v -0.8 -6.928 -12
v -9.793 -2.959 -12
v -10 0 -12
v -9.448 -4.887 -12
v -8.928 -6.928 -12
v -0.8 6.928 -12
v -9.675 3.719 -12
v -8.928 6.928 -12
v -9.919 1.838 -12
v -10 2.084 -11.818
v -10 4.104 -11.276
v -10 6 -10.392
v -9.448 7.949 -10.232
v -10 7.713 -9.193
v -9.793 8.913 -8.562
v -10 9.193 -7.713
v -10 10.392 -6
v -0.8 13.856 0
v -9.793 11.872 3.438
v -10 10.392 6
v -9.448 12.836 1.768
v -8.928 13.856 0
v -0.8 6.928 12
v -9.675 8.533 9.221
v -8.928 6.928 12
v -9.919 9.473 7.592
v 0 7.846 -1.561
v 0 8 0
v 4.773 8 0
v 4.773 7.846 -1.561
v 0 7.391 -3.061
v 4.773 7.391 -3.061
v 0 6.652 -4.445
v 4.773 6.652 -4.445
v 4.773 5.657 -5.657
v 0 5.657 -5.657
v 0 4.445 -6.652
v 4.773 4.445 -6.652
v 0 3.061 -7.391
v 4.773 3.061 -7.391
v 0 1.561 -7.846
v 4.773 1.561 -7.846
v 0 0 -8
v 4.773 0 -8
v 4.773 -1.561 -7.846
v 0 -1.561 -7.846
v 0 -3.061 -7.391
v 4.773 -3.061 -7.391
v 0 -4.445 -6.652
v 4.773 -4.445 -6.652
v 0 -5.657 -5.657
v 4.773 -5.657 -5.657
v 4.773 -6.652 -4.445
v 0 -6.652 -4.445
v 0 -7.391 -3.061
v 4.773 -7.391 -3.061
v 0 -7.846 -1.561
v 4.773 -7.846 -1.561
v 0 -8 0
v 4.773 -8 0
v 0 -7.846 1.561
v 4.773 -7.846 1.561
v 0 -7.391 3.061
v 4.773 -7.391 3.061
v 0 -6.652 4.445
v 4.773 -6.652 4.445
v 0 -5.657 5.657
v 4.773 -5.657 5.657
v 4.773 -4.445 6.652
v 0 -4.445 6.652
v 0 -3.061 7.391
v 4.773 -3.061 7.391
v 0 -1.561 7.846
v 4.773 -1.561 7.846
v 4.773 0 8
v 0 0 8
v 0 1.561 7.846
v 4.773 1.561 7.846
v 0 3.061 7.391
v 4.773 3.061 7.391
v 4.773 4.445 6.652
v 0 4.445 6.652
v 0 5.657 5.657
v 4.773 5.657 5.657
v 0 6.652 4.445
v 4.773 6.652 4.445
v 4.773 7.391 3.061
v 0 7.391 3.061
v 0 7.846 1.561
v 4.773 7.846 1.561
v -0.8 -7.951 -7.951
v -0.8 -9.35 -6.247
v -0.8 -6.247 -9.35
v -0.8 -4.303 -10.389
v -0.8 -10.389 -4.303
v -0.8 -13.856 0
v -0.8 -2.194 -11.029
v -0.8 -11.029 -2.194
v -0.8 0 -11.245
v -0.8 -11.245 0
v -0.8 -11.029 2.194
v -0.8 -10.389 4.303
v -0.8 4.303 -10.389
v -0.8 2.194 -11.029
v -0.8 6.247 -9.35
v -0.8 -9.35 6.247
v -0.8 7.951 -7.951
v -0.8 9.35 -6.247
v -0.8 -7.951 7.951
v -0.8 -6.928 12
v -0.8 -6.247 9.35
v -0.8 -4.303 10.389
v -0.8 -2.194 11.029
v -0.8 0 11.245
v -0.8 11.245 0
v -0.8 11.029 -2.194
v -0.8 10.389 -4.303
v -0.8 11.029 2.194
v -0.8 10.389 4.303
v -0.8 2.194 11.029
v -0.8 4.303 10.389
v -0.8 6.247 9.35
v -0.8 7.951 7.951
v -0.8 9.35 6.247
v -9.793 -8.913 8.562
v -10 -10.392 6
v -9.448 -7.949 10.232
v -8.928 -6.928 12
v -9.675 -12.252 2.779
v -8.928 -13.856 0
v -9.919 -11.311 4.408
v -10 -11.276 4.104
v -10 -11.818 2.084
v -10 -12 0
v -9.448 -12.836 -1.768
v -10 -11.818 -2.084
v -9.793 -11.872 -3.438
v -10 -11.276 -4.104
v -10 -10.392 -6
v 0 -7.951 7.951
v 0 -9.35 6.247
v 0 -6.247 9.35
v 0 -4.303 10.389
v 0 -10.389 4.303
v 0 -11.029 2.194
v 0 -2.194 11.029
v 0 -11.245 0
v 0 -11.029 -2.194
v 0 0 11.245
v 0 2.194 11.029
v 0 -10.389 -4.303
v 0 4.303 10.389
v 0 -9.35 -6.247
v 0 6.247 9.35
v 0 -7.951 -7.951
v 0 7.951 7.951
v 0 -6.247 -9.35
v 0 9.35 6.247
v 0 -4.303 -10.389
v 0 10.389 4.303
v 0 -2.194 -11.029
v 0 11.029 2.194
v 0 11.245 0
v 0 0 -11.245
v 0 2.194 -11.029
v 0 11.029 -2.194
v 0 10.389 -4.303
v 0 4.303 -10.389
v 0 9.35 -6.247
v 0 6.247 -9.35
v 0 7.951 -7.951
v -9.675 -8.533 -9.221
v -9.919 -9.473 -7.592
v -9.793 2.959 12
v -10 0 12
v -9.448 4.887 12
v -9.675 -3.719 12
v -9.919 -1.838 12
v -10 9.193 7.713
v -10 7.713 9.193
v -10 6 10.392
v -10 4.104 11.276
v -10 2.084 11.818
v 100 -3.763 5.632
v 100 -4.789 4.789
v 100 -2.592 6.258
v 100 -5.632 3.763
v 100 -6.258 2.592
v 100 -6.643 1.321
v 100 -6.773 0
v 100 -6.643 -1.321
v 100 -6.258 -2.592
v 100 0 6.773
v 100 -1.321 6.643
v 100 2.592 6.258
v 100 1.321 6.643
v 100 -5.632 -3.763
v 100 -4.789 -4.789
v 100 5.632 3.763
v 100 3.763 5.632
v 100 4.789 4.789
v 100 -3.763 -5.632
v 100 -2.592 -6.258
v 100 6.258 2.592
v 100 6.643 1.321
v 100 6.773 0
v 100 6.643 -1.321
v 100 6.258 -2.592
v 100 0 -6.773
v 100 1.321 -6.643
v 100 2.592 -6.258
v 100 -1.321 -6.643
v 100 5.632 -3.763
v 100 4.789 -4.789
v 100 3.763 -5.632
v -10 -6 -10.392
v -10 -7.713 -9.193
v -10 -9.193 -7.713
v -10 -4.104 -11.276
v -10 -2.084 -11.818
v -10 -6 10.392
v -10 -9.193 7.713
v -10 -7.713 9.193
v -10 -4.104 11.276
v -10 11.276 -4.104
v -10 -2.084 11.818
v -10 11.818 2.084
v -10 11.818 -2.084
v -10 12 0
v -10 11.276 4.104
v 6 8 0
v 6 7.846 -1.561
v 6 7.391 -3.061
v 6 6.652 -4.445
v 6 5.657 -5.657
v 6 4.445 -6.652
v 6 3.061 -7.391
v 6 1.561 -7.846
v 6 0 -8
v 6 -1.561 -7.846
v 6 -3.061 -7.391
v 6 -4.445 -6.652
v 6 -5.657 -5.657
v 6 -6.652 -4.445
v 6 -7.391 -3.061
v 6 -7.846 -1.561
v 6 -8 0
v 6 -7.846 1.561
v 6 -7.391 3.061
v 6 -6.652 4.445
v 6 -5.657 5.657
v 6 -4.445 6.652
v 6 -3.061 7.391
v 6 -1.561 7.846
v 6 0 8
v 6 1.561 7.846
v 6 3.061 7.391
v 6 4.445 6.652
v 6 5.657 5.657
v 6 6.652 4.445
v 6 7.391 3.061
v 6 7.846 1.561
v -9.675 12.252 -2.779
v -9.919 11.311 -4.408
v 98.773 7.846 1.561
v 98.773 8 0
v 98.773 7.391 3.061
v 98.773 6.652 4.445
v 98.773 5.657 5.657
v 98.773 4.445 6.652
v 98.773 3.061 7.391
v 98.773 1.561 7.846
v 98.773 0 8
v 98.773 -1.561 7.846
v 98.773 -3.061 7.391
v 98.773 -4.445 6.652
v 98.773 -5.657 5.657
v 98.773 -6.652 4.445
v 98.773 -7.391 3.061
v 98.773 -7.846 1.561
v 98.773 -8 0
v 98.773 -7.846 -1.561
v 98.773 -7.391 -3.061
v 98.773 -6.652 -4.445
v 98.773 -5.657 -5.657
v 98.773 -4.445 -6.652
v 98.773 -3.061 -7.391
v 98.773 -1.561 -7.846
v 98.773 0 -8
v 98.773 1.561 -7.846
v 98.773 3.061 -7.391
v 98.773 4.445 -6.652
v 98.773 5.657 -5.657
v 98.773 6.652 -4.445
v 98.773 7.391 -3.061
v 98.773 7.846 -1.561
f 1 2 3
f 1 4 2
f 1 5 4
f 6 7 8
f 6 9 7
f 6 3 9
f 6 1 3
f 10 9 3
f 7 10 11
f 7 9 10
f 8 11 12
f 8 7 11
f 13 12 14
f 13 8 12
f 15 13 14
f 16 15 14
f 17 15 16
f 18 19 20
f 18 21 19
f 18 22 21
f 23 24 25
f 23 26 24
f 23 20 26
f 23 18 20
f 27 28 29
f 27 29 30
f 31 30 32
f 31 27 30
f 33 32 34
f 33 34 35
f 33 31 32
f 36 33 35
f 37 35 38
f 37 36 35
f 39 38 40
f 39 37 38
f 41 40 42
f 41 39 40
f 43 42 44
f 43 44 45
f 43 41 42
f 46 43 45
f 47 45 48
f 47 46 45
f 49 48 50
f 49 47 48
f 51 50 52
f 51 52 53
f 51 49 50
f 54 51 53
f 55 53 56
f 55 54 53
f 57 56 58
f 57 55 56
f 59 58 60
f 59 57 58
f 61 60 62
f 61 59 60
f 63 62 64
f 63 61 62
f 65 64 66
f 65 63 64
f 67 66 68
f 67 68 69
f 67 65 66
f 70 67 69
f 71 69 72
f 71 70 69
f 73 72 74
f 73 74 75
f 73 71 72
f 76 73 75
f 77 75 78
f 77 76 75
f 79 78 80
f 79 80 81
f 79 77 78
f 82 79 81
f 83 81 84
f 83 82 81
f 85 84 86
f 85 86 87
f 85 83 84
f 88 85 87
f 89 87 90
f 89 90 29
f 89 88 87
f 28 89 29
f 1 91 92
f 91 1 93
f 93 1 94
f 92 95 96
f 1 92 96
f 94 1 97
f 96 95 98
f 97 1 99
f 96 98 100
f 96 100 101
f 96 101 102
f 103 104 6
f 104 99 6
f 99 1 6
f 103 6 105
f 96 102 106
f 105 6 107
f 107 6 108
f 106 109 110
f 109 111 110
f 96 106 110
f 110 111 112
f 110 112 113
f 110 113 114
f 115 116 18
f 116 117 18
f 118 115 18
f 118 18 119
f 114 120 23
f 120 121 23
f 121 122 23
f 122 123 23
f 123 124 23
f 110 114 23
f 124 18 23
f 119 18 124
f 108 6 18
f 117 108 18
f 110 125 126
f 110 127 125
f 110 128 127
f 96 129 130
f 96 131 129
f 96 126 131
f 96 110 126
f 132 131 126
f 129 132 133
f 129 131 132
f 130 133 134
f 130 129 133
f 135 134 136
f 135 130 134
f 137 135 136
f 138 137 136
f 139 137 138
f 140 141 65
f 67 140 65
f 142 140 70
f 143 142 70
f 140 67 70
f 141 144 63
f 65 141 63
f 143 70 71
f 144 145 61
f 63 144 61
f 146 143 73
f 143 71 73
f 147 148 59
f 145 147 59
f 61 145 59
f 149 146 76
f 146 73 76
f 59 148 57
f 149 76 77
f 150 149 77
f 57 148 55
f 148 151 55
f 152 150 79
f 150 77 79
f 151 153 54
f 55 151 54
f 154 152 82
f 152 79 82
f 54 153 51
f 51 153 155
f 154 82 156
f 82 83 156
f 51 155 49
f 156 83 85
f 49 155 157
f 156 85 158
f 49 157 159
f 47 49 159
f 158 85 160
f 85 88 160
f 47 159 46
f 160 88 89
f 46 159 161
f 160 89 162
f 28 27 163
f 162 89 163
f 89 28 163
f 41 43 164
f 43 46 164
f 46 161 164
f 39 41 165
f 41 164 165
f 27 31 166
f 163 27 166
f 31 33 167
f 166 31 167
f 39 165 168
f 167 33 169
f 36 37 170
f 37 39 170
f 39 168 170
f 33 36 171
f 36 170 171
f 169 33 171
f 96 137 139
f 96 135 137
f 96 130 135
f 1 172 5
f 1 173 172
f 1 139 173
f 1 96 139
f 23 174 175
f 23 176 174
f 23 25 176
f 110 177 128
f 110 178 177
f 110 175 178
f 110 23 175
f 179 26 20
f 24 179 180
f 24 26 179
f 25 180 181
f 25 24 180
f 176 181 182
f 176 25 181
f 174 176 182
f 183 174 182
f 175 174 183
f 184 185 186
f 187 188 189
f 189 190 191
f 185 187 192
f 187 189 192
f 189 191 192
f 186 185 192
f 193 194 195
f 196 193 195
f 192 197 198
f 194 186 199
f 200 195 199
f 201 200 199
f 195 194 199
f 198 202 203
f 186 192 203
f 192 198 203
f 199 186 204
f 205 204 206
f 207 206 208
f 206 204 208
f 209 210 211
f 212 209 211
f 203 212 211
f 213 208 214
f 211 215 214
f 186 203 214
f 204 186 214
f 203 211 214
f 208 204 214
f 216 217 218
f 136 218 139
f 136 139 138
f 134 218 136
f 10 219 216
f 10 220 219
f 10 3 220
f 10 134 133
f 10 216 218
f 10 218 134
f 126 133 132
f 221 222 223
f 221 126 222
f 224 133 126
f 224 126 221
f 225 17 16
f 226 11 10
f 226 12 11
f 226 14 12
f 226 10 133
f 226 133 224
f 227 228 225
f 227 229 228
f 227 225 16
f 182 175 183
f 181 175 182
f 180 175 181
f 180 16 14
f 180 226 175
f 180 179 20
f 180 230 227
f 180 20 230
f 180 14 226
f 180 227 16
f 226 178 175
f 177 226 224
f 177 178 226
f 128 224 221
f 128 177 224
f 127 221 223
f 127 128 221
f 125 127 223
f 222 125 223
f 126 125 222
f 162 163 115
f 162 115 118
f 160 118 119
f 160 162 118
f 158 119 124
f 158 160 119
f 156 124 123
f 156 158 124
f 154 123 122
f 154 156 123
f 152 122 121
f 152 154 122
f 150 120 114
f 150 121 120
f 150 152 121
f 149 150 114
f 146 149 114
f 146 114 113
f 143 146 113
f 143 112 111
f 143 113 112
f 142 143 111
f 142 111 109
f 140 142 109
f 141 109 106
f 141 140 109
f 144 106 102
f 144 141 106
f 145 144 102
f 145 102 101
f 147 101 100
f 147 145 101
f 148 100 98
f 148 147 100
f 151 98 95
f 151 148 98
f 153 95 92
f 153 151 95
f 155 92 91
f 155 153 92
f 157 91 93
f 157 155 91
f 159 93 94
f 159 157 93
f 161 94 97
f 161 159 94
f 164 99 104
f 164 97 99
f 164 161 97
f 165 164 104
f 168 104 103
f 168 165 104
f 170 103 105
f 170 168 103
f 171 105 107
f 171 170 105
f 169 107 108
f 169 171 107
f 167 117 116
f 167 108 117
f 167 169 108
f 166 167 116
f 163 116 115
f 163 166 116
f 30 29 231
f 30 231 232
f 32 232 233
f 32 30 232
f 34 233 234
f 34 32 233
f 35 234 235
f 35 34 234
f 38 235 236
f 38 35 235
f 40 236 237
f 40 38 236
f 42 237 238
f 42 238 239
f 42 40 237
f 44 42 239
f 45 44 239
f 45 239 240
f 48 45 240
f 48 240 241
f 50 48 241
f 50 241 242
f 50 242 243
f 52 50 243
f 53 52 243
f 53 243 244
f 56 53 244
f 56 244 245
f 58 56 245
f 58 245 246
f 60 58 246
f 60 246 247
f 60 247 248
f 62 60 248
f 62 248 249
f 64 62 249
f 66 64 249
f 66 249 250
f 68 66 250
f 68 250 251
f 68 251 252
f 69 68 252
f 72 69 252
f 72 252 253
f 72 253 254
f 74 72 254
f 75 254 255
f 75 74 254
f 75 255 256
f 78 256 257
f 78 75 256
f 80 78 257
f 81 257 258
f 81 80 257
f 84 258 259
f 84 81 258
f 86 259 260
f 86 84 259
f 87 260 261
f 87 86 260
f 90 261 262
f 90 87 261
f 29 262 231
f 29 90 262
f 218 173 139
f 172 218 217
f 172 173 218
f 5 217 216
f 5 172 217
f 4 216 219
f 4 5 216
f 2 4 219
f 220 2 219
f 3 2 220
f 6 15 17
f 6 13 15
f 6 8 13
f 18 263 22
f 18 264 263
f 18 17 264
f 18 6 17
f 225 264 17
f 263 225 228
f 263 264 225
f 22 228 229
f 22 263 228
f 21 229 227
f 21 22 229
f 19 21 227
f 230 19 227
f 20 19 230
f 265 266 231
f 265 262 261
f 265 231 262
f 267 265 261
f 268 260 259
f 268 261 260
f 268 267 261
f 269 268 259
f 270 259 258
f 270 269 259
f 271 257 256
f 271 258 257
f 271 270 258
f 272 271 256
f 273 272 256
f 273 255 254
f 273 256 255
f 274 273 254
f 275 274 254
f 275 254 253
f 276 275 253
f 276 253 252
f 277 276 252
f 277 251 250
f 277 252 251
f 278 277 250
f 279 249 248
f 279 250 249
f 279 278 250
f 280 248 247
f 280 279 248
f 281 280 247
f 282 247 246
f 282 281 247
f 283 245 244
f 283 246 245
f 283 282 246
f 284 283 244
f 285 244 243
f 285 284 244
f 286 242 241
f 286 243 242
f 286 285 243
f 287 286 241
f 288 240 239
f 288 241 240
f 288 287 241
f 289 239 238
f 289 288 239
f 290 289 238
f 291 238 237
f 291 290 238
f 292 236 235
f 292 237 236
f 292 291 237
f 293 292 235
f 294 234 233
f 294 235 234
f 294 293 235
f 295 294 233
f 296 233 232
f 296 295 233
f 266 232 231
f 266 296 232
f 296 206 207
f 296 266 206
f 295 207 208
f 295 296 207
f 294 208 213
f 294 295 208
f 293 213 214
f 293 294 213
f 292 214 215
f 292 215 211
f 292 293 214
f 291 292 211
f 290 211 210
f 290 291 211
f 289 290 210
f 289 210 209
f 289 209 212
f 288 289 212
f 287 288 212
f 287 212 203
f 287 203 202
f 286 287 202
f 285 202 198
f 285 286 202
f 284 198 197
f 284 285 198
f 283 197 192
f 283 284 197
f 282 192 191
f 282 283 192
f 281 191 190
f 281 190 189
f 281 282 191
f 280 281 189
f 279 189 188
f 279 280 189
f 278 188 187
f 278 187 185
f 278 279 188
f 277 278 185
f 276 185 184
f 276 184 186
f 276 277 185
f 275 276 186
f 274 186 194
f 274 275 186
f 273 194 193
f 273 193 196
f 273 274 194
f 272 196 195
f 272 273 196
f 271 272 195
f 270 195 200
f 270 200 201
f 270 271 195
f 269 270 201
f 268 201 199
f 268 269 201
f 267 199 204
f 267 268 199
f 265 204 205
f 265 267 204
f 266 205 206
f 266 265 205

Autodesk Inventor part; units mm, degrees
ref_plane "YZ Plane" through (0, 0, 0) normal (1, 0, 0) x (0, 1, 0)
ref_plane "XZ Plane" through (0, 0, 0) normal (0, 1, 0) x (-1, 0, 0)
sketch "Sketch1" plane through (0, 0, 0) normal (0, 0, 1) x (1, 0, 0)
  line L0 (0, 11.245) -> (0, 8)
  line L1 (6, 8) -> (100, 8)
  line L2 (100, 8) -> (100, 0)
  line L3 (100, 0) -> (-0.8001, 0)
  line L4 (-20.9601, 0) -> (120.16, 0) projected
  line L5 (-0.8001, 0) -> (-0.8001, 11.245)
  line L6 (-0.8001, 11.245) -> (0, 11.245)
  line L7 (6, 8) -> (4.773, 8)
  line L8 (4.773, 8) -> (0, 8)
  line L9 (0, -2.249) -> (0, 13.494) projected
  dimension "d0" = 100
  dimension "d1" = 94
  dimension "d2" = 16
  dimension "d9" = 0.8001
  dimension "d10" = 22.49
  dimension "d13" = 1.227
  dimension "d14" = 16
revolve "Body" add sketch "Sketch1" angle 360 about axis through (100, 0, 0) along (-1, 0, 0)
sketch "Sketch2" plane through (-0.8001, 0, 0) normal (-1, 0, 0) x (0, 0, 1)
  line L0 (0, 13.8564) -> (12, 6.9282)
  line L1 (12, 6.9282) -> (12, -6.9282)
  line L2 (12, -6.9282) -> (0, -13.8564)
  line L3 (0, -13.8564) -> (-12, -6.9282)
  line L4 (-12, -6.9282) -> (-12, 6.9282)
  line L5 (-12, 6.9282) -> (0, 13.8564)
  point P0 (0, 0)
  point P1 (0, 0)
  dimension "d11" = 24
extrude "Head" add sketch "Sketch2" along normal blind 9.2
sketch "Sketch4" plane through (0, 0, 0) normal (0, 0, 1) x (1, 0, 0)
  line L0 (-10.0001, 12) -> (-10.0001, 13.8564)
  line L1 (-10.0001, 13.8564) -> (-8.9283, 13.8564)
  line L2 (-8.9283, 13.8564) -> (-10.0001, 12)
  line L3 (-11.8401, 0) -> (1.0399, 0) projected
  line L4 (-0.8001, 13.8564) -> (-10.0001, 13.8564) projected
  line L5 (-10.0001, 6.9282) -> (-10.0001, 13.8564) projected
  dimension "d5" = 30
  dimension "d19" = 24
revolve "Chamfer1" cut sketch "Sketch4" angle 360 about axis through (-10, 0, 0) along (1, 0, 0)
thread "Thread" size "M16x2" class "6g" standard "ISO Metric profile" length 94
chamfer "Chamfer2" distance 1.2269 distance2 1.227 1 edges at (100, -8, 0) measured on face at (100, -0.9456, 1.8959)
ref_plane "Work Plane1" through (1.525, 0, 0) normal (0, 0, 1) x (1, 0, 0)
equation "\"d0\" = NLG"
equation "\"d1\" = GEL"
equation "\"d2\" = GD"
equation "\"d10\" = SD2"
equation "\"d14\" = BDM"
equation "\"d11\" = SW"
equation "\"d3\" = KOH - SD"
equation "\"d5\" = ANG1"
equation "\"d19\" = SW0"
equation "\"d15\" = GEL"
equation "\"d6\" = -0.5 * SPD + 0.5 * GD"
equation "\"NLG\" = 100"
equation "\"GD\" = NND"
equation "\"BDM\" = NND"
equation "\"KOH\" = 10"
equation "\"GEL\" = 94"
equation "\"SW\" = 24"
equation "\"SW0\" = SW"
equation "\"SPD\" = NND - 1.2269 * PTC"
equation "\"SD2\" = 22.49"
equation "\"SD\" = 0.8"
equation "\"ANG1\" = 30deg"
equation "\"GAL\" = 0.61345 * PTC"
equation "\"GUL\" = 0.61345 * PTC"
equation "\"RR\" = 0.6"
equation "\"GD1\" = THREADDIA - 1.2269 * PTC"
equation "\"THREADDIA\" = 16"
equation "\"SDH\" = SD2"
equation "\"SDHG\" = 6"
equation "\"TOA\" = 30deg"
equation "\"PTC\" = 2"
equation "\"NND\" = 16"
equation "\"E0\" = 27.72"
properties part number "ISO 4017 - M16 x 100" material "Steel, Mild"
